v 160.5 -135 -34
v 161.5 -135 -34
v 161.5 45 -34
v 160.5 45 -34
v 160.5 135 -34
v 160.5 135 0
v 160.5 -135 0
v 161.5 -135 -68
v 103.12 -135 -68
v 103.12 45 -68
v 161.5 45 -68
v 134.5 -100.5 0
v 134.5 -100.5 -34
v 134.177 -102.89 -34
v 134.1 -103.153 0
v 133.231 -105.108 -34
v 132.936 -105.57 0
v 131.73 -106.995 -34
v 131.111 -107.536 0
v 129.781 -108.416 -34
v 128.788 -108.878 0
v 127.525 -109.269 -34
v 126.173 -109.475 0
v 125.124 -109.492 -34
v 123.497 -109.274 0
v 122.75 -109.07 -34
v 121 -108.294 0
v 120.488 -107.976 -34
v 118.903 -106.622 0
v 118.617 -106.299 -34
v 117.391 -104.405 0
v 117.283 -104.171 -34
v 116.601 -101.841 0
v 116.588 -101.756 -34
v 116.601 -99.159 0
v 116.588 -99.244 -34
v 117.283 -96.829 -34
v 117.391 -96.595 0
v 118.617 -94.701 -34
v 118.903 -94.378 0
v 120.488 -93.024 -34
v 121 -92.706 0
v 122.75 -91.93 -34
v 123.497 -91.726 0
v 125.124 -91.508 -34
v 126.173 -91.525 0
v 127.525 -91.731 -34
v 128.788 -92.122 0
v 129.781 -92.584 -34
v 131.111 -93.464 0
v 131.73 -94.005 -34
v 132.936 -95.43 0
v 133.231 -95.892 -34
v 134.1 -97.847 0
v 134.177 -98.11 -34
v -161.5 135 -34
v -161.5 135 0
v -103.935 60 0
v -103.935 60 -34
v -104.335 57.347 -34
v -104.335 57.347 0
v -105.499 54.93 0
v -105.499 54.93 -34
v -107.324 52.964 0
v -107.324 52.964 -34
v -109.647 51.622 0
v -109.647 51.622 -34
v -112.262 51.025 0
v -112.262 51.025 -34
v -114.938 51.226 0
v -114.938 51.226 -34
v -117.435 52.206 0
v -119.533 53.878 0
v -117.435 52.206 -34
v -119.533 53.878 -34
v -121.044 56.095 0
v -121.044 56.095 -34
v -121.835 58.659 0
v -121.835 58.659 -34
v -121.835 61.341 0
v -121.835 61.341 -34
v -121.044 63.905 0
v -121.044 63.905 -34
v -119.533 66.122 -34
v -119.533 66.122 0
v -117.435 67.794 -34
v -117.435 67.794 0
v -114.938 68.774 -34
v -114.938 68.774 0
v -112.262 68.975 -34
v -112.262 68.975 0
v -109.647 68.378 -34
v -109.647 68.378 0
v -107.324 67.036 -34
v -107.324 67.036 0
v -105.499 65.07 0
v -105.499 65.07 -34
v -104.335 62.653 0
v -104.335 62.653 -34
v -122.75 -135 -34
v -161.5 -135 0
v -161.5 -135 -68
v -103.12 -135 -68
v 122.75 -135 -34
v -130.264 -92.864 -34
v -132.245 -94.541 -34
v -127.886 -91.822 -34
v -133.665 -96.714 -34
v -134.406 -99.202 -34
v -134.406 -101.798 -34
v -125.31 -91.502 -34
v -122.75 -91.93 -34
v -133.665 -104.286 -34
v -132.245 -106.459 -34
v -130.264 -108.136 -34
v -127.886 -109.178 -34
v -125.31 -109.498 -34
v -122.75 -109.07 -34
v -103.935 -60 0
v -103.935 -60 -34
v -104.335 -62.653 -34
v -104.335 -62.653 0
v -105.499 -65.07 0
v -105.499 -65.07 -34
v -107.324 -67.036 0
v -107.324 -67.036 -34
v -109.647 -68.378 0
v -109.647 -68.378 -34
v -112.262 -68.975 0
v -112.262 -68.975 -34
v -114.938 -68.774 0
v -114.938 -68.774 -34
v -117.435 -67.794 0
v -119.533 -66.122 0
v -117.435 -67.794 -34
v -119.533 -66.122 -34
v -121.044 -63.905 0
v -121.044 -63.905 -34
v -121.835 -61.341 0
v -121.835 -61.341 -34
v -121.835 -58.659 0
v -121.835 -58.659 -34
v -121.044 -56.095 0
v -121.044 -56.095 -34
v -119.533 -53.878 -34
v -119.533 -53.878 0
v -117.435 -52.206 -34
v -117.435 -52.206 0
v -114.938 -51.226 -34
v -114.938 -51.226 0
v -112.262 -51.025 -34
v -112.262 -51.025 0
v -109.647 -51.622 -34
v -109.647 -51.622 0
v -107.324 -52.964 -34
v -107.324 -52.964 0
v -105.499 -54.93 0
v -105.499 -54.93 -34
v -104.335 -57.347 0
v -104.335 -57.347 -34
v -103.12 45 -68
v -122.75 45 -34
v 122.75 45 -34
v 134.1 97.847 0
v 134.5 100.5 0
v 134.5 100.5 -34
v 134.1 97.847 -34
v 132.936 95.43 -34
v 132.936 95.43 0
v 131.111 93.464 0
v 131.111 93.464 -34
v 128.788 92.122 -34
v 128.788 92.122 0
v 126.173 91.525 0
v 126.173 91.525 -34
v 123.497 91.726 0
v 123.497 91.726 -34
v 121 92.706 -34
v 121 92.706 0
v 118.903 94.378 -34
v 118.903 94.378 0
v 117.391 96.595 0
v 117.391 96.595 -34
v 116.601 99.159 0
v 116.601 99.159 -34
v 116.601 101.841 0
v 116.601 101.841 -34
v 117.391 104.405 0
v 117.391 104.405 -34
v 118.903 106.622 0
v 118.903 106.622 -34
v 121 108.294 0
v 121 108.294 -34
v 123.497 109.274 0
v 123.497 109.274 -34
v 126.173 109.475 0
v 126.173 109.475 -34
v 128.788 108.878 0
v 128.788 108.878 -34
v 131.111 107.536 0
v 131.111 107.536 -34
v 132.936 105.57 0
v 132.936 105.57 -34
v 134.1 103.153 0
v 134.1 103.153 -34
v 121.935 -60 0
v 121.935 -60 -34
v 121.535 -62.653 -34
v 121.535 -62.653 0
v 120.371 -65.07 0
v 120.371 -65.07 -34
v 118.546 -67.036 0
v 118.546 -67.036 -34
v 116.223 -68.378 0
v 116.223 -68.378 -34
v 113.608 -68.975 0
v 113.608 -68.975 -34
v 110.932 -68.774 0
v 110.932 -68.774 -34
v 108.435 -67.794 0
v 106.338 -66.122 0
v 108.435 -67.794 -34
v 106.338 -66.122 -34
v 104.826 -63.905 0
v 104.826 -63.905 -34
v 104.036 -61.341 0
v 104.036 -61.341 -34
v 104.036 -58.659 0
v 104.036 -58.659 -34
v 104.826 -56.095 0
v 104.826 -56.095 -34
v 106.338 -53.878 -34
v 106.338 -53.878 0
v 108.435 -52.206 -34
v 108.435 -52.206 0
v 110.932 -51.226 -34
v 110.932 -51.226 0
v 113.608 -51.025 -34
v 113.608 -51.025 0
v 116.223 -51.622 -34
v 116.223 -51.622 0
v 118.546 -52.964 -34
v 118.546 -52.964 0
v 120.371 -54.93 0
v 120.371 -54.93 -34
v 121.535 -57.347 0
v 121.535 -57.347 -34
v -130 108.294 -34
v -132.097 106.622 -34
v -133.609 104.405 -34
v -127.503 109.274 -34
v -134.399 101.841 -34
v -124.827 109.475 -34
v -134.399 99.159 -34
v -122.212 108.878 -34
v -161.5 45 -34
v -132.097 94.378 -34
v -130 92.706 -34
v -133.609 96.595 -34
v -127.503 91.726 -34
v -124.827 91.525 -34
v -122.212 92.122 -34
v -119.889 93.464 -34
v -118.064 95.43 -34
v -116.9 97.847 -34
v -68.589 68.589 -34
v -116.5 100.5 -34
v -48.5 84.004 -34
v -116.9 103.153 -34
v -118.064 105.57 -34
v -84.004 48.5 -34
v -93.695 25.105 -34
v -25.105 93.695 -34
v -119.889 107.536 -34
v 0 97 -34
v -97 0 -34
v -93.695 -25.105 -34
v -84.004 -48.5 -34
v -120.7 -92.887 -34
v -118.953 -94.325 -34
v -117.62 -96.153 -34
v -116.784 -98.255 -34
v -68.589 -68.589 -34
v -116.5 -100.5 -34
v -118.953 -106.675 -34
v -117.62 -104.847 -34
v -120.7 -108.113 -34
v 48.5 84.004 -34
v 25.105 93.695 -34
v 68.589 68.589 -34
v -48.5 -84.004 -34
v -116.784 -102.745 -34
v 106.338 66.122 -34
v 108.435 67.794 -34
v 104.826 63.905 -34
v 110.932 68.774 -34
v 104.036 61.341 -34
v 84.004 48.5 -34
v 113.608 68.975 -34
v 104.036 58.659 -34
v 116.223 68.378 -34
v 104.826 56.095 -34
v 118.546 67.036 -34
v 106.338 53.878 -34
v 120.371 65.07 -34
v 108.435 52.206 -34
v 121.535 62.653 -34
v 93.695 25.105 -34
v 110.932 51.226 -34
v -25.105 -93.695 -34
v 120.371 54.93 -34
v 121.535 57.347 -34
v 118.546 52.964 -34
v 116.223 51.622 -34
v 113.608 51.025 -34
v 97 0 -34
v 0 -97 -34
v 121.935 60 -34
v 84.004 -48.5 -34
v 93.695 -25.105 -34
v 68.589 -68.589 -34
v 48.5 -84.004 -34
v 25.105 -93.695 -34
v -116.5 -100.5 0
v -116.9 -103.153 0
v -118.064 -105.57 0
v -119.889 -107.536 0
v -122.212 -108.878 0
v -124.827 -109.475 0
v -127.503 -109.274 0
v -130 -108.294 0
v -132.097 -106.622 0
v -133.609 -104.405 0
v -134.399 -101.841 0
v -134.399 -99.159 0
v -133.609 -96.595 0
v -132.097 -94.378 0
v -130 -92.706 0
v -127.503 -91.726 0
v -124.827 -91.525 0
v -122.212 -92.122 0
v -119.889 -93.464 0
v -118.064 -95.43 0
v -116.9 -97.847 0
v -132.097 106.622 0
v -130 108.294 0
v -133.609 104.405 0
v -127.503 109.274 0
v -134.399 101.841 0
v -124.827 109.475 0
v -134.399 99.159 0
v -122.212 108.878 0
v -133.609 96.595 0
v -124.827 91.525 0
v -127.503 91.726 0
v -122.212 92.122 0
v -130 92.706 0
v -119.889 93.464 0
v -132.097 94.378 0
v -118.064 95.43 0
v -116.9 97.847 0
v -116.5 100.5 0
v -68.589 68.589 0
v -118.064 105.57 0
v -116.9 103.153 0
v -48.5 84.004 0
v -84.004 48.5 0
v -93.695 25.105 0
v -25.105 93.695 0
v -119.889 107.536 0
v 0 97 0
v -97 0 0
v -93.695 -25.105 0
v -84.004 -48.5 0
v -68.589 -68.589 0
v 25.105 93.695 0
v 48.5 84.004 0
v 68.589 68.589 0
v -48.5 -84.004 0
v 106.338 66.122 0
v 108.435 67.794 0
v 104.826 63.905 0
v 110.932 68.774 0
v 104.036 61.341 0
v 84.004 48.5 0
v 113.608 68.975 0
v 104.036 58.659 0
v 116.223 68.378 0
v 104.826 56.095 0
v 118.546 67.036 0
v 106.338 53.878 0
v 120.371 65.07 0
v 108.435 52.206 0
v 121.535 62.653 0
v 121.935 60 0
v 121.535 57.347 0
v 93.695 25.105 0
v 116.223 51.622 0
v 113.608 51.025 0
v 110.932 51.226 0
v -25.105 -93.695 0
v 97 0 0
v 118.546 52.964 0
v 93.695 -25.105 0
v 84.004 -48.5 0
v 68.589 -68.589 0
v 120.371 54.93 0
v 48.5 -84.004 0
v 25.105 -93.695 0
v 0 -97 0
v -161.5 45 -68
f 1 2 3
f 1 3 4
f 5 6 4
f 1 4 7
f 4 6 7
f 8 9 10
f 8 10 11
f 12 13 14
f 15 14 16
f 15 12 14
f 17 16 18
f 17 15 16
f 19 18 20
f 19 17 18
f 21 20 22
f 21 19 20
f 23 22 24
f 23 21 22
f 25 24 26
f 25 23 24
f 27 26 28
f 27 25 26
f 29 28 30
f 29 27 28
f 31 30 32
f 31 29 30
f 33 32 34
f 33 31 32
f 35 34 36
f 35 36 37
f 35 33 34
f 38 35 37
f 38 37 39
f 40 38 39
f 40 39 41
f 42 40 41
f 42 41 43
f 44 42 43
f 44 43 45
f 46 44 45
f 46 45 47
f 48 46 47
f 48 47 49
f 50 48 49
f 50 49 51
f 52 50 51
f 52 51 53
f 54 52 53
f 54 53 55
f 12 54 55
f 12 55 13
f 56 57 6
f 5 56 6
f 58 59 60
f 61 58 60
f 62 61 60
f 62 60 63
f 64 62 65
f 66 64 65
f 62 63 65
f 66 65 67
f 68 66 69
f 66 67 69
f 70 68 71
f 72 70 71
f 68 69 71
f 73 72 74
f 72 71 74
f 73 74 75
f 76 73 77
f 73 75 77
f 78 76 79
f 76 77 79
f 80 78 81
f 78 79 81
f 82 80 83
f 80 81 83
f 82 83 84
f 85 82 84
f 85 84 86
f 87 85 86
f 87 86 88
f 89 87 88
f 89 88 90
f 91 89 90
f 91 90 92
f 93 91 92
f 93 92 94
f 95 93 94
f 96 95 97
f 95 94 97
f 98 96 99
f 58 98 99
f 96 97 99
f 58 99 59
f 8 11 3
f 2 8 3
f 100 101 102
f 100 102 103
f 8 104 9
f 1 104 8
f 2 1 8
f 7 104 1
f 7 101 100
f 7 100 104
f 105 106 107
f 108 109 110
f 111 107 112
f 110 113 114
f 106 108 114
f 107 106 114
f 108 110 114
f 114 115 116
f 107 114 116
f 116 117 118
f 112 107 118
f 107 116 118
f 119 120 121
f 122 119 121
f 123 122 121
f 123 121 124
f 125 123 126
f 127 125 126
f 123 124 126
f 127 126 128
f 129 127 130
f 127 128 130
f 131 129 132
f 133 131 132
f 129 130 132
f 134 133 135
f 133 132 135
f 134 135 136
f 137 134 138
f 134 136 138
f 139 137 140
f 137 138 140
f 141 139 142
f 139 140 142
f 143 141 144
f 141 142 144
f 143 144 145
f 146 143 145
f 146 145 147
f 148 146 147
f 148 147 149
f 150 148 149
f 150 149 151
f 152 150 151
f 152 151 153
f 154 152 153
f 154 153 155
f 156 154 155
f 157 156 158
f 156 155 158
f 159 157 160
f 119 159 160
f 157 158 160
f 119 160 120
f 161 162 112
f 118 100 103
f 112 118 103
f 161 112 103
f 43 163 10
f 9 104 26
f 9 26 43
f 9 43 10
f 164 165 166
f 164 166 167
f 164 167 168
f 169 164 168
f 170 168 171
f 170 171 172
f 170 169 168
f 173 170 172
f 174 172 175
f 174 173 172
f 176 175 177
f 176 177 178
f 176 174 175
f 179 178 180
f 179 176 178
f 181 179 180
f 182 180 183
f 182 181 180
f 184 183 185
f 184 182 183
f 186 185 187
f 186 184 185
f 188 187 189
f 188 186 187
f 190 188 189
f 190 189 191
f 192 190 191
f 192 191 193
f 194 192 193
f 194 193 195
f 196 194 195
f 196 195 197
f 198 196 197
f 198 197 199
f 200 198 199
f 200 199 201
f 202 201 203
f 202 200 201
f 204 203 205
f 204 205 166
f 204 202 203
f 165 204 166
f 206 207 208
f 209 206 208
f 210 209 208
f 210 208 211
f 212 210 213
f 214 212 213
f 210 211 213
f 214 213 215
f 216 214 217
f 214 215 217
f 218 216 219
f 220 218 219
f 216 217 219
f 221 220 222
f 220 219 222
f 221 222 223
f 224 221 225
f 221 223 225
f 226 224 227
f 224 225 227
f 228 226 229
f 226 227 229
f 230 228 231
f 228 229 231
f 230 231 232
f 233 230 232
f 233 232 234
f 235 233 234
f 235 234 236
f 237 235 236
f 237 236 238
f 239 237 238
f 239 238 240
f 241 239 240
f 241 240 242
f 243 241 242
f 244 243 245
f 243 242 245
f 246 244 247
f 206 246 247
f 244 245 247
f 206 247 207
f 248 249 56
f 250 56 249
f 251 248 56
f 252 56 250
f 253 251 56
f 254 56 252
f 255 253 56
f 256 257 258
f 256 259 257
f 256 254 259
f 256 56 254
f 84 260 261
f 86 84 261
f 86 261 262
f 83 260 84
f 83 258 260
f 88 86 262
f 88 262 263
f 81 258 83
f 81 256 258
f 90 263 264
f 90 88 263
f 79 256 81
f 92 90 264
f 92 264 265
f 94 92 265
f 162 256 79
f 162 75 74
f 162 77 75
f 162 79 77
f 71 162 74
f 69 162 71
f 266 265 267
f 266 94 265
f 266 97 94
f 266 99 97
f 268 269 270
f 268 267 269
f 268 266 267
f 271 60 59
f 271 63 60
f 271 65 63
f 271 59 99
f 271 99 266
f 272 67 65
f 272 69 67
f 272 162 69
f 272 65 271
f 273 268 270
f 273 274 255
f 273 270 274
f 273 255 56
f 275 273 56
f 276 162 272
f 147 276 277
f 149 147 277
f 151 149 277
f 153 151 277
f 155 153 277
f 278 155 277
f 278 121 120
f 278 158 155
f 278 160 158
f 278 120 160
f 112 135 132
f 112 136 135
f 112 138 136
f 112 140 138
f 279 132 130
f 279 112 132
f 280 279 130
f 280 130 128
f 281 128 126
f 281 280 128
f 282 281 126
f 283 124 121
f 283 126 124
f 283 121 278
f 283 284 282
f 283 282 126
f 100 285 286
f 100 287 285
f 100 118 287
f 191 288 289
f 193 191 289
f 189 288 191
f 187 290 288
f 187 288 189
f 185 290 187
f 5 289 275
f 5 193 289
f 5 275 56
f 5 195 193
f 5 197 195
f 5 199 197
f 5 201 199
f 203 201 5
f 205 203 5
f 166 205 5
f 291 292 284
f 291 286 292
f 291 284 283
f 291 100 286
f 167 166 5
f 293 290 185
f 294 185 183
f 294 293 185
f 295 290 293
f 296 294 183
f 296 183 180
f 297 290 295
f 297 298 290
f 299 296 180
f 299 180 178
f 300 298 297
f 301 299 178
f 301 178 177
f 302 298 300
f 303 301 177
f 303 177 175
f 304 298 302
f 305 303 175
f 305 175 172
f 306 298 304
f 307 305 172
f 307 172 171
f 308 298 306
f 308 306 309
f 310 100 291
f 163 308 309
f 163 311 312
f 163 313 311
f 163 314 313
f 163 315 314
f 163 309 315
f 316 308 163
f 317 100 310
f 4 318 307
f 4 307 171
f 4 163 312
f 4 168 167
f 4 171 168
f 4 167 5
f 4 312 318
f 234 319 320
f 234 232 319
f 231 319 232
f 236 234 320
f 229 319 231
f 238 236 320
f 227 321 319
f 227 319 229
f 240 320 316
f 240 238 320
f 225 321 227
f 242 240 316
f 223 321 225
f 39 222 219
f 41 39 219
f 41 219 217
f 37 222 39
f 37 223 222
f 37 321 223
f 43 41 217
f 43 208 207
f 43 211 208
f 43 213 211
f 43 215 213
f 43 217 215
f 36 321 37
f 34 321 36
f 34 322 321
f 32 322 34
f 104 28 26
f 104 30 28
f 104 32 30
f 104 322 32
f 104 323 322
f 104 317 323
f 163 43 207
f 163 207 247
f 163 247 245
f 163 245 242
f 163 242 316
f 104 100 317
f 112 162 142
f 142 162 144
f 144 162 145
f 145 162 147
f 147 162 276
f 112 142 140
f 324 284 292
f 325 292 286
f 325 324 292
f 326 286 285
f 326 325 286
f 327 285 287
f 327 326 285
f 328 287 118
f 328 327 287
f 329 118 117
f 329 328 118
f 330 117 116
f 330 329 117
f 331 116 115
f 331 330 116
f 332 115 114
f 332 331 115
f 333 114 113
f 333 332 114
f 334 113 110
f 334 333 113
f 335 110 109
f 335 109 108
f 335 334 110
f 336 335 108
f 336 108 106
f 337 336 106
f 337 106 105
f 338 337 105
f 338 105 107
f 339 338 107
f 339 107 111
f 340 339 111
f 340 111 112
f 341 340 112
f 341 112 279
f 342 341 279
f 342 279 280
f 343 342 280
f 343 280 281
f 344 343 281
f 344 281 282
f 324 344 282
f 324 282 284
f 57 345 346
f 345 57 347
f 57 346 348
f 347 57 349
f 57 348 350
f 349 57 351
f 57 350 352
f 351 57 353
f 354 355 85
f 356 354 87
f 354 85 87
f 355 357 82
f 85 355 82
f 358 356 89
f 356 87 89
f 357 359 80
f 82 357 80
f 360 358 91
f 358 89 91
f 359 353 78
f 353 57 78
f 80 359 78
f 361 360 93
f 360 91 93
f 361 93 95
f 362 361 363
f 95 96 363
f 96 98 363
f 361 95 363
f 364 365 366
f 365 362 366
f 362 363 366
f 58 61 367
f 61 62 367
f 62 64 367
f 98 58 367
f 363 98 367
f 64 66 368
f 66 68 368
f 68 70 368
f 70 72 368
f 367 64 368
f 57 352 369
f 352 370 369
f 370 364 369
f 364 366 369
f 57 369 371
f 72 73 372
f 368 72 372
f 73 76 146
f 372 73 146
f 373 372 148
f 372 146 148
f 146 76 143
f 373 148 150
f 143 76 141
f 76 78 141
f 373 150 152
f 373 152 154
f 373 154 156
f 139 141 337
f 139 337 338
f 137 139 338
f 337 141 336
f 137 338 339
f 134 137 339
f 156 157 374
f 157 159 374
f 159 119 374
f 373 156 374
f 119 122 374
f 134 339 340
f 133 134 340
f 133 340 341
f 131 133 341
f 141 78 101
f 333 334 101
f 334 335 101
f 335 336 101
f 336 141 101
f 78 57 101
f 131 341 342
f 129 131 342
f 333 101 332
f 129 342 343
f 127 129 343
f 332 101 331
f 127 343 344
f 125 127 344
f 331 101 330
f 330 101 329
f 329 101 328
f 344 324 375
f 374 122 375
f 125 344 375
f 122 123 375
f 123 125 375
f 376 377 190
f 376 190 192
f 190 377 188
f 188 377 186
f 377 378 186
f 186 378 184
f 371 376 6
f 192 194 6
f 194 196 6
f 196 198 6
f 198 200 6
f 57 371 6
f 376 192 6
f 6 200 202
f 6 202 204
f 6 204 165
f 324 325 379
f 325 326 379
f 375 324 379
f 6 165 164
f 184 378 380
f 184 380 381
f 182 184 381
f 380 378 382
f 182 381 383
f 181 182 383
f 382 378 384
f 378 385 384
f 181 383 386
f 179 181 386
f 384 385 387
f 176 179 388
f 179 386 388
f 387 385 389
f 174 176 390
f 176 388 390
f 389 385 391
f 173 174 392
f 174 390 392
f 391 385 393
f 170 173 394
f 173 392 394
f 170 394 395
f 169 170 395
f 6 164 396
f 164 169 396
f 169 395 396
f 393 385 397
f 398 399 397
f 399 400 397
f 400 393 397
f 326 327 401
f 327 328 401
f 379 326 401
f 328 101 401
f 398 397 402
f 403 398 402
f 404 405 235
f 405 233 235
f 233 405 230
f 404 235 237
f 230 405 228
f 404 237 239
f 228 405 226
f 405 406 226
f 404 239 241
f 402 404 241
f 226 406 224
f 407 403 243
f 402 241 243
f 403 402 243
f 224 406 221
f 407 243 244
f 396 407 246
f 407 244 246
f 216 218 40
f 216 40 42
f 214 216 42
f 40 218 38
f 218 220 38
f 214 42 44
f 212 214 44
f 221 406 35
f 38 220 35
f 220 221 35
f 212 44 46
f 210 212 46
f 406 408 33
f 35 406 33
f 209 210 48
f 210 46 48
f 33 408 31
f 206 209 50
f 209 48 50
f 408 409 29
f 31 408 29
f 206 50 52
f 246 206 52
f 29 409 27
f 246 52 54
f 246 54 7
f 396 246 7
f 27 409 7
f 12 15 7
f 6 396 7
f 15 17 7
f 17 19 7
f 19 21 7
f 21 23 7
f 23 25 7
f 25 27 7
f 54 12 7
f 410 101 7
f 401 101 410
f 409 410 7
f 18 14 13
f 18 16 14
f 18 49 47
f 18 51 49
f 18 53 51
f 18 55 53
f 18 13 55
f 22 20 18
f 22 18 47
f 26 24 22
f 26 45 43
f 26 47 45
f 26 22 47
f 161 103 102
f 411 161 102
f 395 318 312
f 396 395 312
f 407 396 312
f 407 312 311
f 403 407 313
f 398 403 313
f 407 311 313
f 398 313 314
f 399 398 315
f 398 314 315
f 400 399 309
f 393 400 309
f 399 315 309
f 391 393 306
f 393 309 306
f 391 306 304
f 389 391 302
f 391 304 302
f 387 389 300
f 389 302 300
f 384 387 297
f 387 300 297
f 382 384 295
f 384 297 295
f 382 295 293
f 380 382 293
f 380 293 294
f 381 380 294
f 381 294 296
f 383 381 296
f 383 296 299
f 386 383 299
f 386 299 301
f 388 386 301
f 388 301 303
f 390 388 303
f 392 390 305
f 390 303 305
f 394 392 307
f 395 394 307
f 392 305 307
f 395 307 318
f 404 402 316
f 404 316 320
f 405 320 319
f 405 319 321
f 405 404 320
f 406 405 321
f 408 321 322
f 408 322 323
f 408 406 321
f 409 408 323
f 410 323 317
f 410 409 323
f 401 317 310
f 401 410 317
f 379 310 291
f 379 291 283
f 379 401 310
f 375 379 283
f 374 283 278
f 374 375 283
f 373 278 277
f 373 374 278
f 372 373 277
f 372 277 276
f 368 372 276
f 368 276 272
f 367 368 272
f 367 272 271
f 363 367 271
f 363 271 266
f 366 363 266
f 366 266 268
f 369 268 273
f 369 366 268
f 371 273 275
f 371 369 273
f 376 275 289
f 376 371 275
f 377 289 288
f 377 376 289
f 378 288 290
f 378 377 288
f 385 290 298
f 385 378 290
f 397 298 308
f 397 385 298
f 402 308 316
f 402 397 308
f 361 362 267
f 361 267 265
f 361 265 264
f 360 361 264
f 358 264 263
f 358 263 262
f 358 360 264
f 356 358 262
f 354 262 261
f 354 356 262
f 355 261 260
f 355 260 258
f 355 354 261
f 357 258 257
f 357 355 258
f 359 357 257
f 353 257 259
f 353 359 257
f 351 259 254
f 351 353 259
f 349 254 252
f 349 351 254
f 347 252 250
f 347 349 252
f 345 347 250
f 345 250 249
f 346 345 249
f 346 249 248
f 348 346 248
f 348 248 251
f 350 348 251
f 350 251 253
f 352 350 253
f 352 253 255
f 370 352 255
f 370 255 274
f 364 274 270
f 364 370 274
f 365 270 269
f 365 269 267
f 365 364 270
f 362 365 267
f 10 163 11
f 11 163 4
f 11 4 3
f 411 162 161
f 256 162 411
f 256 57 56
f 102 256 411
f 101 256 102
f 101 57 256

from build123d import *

# Parameters (mm, degrees)
SKETCH003_W   = 322
SKETCH003_H   = 270
SKETCH003_R   = 97
SKETCH003_R_2 = 9
PAD003_DEPTH  = 34
PAD004_DEPTH  = 180
SKETCH005_R   = 9
HOLE_DEPTH    = 34


with BuildPart() as part:
    # Sketch003 (on Face1 of ShapeBinder) → Pad003 (new body)
    with BuildSketch(Plane(origin=(0, 0, 0), x_dir=(1, 0, 0), z_dir=(0, 0, -1))):
        with Locations((-0.5, 0)):
            Rectangle(SKETCH003_W, SKETCH003_H)
        Circle(SKETCH003_R, mode=Mode.SUBTRACT)
        with Locations((-125.5, 100.5)):
            Circle(SKETCH003_R_2, mode=Mode.SUBTRACT)
        with Locations((125.5, 100.5)):
            Circle(SKETCH003_R_2, mode=Mode.SUBTRACT)
        with Locations((-125.5, -100.5)):
            Circle(SKETCH003_R_2, mode=Mode.SUBTRACT)
        with Locations((125.5, -100.5)):
            Circle(SKETCH003_R_2, mode=Mode.SUBTRACT)
    extrude(amount=PAD003_DEPTH)

    # Sketch004 (on Face1 of Pad003) → Pad004 (join)
    with BuildSketch(Plane.XZ.offset(135)):
        Polygon((-161.5, -34), (-122.75, -34), (-103.120091, -68), (-161.5, -68), align=None)
    pad004 = extrude(amount=-PAD004_DEPTH)

    # Mirrored: Pad004 across Sketch004 V_Axis
    add(pad004.mirror(Plane(origin=(0, -135, 0), x_dir=(0, -1, 0), z_dir=(1, 0, 0))))

    # Sketch005 (on Face6 of Mirrored) → Hole (cut)
    with BuildSketch(Plane(origin=(0, 0, -34), x_dir=(1, 0, 0), z_dir=(0, 0, -1))):
        with Locations((-112.935045, 60)):
            Circle(SKETCH005_R)
        with Locations((-112.935045, -60)):
            Circle(SKETCH005_R)
        with Locations((112.935045, 60)):
            Circle(SKETCH005_R)
        with Locations((112.935045, -60)):
            Circle(SKETCH005_R)
    extrude(amount=-HOLE_DEPTH, mode=Mode.SUBTRACT)


solid = part.part
